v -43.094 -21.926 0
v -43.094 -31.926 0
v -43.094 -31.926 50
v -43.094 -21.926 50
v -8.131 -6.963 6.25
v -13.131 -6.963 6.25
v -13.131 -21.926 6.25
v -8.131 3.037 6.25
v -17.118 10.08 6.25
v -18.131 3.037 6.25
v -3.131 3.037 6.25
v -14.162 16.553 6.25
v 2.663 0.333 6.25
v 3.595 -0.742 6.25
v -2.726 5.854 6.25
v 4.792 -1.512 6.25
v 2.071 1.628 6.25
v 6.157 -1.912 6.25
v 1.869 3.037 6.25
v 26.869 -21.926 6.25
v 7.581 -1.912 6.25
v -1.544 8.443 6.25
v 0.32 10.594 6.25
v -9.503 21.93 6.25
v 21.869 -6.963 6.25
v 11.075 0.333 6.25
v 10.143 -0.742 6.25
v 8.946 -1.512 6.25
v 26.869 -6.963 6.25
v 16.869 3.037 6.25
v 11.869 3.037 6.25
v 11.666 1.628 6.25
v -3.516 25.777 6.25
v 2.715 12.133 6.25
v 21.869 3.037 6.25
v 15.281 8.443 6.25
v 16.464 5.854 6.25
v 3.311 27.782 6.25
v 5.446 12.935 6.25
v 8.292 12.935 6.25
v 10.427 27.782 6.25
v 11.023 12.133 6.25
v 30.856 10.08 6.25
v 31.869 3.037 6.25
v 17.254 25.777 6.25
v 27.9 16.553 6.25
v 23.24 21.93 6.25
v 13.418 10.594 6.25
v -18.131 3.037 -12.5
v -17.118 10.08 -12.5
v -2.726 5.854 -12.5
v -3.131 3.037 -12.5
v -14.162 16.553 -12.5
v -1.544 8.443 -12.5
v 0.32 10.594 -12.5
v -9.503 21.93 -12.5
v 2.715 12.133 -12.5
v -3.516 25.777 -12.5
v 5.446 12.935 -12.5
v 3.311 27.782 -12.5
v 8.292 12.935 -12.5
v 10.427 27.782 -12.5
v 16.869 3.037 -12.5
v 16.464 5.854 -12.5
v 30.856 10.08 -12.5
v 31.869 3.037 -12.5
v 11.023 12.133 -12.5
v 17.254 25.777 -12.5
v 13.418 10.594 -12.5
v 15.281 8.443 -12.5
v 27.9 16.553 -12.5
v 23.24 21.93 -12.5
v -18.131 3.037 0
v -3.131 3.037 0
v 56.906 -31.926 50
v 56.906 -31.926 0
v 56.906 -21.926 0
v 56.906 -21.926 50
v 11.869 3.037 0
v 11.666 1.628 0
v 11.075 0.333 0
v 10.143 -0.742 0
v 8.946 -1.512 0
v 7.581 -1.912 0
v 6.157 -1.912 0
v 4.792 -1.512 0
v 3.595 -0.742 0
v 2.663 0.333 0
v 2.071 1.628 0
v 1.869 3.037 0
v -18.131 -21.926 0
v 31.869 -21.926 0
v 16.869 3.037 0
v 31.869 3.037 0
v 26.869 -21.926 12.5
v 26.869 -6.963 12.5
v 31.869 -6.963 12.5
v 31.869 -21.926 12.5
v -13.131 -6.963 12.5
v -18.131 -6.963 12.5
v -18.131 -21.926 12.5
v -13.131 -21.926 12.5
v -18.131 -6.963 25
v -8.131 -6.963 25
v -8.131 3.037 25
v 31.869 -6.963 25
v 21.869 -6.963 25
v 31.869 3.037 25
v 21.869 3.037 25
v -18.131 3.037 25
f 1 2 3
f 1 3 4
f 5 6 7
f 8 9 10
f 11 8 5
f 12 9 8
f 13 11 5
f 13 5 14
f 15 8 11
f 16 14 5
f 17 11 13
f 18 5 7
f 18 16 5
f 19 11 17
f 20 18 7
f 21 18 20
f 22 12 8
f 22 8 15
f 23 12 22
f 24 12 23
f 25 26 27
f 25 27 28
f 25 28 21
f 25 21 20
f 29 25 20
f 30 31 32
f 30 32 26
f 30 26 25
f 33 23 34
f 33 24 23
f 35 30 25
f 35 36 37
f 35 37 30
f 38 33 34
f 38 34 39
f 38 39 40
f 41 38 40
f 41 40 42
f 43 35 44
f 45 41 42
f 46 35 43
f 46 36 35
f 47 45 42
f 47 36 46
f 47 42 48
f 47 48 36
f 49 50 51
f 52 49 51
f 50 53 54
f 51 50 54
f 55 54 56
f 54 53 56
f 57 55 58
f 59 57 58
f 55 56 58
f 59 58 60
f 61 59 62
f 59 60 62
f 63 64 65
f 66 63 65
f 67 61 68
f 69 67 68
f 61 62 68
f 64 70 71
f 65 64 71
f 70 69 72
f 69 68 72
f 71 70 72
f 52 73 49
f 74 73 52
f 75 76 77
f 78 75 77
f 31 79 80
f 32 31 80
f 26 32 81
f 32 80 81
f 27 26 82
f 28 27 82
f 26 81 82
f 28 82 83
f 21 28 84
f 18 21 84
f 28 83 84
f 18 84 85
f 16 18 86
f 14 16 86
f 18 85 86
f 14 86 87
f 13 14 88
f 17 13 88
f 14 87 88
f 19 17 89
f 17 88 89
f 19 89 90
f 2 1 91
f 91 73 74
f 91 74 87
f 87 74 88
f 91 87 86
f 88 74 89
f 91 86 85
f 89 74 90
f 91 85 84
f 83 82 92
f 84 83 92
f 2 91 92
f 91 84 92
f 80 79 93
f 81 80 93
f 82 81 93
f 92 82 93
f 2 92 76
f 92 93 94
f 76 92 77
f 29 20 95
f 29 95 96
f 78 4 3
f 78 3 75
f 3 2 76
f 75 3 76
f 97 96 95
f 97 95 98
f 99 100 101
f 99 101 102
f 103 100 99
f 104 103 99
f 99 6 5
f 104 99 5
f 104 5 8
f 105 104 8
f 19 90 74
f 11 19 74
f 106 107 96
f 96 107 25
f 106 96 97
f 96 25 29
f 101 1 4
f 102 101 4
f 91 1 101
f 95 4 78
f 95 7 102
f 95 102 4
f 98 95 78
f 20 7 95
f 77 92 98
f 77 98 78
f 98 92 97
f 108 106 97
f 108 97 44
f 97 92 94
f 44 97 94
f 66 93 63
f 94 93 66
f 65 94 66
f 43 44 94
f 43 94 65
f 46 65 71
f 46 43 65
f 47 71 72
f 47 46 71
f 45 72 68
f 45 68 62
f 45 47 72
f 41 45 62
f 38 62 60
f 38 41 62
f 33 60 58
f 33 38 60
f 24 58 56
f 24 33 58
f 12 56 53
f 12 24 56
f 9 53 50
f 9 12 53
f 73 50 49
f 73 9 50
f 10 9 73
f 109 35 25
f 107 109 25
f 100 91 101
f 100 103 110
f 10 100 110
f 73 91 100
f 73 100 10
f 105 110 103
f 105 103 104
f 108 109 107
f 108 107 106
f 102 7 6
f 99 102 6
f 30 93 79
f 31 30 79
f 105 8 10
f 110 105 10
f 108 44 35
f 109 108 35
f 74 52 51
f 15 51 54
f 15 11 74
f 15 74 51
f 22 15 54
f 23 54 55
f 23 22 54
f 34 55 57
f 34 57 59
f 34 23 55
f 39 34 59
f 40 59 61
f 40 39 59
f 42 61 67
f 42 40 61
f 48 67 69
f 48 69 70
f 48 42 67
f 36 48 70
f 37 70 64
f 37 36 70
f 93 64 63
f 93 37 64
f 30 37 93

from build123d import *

# Parameters (mm, degrees)
BOSS_EXTRUDE1_DEPTH   = 50
SKETCH1_6_W           = 10
SKETCH1_6_H           = 10
BOSS_EXTRUDE2_DEPTH   = 25
BOSS_EXTRUDE2_2_DEPTH = 25
SKETCH1_7_W           = 5
SKETCH1_7_H           = 14.963037634
BOSS_EXTRUDE3_DEPTH   = 12.5
BOSS_EXTRUDE4_DEPTH   = 6.25
BOSS_EXTRUDE5_START   = -12.5
BOSS_EXTRUDE5_DEPTH   = 12.5


with BuildPart() as part:
    # Sketch1 → Boss-Extrude1 (new body)
    with BuildSketch(Plane.XY):
        Polygon((-43.094086022, -21.92641129), (-43.094086022, -31.92641129), (56.905913978, -31.92641129), (56.905913978, -21.92641129), (31.868951613, -21.92641129), (26.868951613, -21.92641129), (-13.131048387, -21.92641129), (-18.131048387, -21.92641129), align=None)
    extrude(amount=BOSS_EXTRUDE1_DEPTH)



with BuildPart() as body_2:
    # Sketch1<6> → Boss-Extrude2 (new body)
    with BuildSketch(Plane.XY):
        with Locations((-13.131048387, -1.963373656)):
            Rectangle(SKETCH1_6_W, SKETCH1_6_H)
    extrude(amount=BOSS_EXTRUDE2_DEPTH)


with BuildPart() as body_3:
    # Sketch1<6> → Boss-Extrude2 2 (new body)
    with BuildSketch(Plane.XY):
        with Locations((26.868951613, -1.963373656)):
            Rectangle(SKETCH1_6_W, SKETCH1_6_H)
    extrude(amount=BOSS_EXTRUDE2_2_DEPTH)


with BuildPart() as part_1:
    add(part.part)

    add(body_2.part)  # Boss-Extrude3 merges body 2

    add(body_3.part)  # Boss-Extrude3 merges body 3
    # Sketch1<7> → Boss-Extrude3 (add)
    with BuildSketch(Plane.XY):
        with Locations((-15.631048387, -14.444892473)):
            Rectangle(SKETCH1_7_W, SKETCH1_7_H)
        with Locations((29.368951613, -14.444892473)):
            Rectangle(SKETCH1_7_W, SKETCH1_7_H)
    extrude(amount=BOSS_EXTRUDE3_DEPTH)

    # Sketch1<8> → Boss-Extrude4 (add)
    with BuildSketch(Plane.XY):
        with BuildLine():
            Line((-13.131048387, -6.963373656), (-13.131048387, -21.92641129))
            Line((-13.131048387, -21.92641129), (26.868951613, -21.92641129))
            Line((26.868951613, -21.92641129), (26.868951613, -6.963373656))
            Line((26.868951613, -6.963373656), (21.868951613, -6.963373656))
            Line((21.868951613, -6.963373656), (21.868951613, 3.036626344))
            Line((21.868951613, 3.036626344), (31.868951613, 3.036626344))
            ThreePointArc((31.868951613, 3.036626344), (6.868951613, 28.036626344), (-18.131048387, 3.036626344))
            Line((-18.131048387, 3.036626344), (-8.131048387, 3.036626344))
            Line((-8.131048387, 3.036626344), (-8.131048387, -6.963373656))
            Line((-8.131048387, -6.963373656), (-13.131048387, -6.963373656))
        make_face()
        with BuildLine():
            Line((1.868951613, 3.036626344), (-3.131048387, 3.036626344))
            ThreePointArc((-3.131048387, 3.036626344), (6.868951613, 13.036626344), (16.868951613, 3.036626344))
            Line((16.868951613, 3.036626344), (11.868951613, 3.036626344))
            ThreePointArc((11.868951613, 3.036626344), (6.868951613, -1.963373656), (1.868951613, 3.036626344))
        make_face(mode=Mode.SUBTRACT)
    extrude(amount=BOSS_EXTRUDE4_DEPTH)

    # Sketch1<9> → Boss-Extrude5 (add)
    with BuildSketch(Plane.XY.offset(BOSS_EXTRUDE5_START)):
        with BuildLine():
            ThreePointArc((31.868951613, 3.036626344), (6.868951613, 28.036626344), (-18.131048387, 3.036626344))
            Line((-18.131048387, 3.036626344), (-8.131048387, 3.036626344))
            Line((-8.131048387, 3.036626344), (-3.131048387, 3.036626344))
            ThreePointArc((-3.131048387, 3.036626344), (6.868951613, 13.036626344), (16.868951613, 3.036626344))
            Line((16.868951613, 3.036626344), (21.868951613, 3.036626344))
            Line((21.868951613, 3.036626344), (31.868951613, 3.036626344))
        make_face()
    extrude(amount=BOSS_EXTRUDE5_DEPTH)


solid = part_1.part
